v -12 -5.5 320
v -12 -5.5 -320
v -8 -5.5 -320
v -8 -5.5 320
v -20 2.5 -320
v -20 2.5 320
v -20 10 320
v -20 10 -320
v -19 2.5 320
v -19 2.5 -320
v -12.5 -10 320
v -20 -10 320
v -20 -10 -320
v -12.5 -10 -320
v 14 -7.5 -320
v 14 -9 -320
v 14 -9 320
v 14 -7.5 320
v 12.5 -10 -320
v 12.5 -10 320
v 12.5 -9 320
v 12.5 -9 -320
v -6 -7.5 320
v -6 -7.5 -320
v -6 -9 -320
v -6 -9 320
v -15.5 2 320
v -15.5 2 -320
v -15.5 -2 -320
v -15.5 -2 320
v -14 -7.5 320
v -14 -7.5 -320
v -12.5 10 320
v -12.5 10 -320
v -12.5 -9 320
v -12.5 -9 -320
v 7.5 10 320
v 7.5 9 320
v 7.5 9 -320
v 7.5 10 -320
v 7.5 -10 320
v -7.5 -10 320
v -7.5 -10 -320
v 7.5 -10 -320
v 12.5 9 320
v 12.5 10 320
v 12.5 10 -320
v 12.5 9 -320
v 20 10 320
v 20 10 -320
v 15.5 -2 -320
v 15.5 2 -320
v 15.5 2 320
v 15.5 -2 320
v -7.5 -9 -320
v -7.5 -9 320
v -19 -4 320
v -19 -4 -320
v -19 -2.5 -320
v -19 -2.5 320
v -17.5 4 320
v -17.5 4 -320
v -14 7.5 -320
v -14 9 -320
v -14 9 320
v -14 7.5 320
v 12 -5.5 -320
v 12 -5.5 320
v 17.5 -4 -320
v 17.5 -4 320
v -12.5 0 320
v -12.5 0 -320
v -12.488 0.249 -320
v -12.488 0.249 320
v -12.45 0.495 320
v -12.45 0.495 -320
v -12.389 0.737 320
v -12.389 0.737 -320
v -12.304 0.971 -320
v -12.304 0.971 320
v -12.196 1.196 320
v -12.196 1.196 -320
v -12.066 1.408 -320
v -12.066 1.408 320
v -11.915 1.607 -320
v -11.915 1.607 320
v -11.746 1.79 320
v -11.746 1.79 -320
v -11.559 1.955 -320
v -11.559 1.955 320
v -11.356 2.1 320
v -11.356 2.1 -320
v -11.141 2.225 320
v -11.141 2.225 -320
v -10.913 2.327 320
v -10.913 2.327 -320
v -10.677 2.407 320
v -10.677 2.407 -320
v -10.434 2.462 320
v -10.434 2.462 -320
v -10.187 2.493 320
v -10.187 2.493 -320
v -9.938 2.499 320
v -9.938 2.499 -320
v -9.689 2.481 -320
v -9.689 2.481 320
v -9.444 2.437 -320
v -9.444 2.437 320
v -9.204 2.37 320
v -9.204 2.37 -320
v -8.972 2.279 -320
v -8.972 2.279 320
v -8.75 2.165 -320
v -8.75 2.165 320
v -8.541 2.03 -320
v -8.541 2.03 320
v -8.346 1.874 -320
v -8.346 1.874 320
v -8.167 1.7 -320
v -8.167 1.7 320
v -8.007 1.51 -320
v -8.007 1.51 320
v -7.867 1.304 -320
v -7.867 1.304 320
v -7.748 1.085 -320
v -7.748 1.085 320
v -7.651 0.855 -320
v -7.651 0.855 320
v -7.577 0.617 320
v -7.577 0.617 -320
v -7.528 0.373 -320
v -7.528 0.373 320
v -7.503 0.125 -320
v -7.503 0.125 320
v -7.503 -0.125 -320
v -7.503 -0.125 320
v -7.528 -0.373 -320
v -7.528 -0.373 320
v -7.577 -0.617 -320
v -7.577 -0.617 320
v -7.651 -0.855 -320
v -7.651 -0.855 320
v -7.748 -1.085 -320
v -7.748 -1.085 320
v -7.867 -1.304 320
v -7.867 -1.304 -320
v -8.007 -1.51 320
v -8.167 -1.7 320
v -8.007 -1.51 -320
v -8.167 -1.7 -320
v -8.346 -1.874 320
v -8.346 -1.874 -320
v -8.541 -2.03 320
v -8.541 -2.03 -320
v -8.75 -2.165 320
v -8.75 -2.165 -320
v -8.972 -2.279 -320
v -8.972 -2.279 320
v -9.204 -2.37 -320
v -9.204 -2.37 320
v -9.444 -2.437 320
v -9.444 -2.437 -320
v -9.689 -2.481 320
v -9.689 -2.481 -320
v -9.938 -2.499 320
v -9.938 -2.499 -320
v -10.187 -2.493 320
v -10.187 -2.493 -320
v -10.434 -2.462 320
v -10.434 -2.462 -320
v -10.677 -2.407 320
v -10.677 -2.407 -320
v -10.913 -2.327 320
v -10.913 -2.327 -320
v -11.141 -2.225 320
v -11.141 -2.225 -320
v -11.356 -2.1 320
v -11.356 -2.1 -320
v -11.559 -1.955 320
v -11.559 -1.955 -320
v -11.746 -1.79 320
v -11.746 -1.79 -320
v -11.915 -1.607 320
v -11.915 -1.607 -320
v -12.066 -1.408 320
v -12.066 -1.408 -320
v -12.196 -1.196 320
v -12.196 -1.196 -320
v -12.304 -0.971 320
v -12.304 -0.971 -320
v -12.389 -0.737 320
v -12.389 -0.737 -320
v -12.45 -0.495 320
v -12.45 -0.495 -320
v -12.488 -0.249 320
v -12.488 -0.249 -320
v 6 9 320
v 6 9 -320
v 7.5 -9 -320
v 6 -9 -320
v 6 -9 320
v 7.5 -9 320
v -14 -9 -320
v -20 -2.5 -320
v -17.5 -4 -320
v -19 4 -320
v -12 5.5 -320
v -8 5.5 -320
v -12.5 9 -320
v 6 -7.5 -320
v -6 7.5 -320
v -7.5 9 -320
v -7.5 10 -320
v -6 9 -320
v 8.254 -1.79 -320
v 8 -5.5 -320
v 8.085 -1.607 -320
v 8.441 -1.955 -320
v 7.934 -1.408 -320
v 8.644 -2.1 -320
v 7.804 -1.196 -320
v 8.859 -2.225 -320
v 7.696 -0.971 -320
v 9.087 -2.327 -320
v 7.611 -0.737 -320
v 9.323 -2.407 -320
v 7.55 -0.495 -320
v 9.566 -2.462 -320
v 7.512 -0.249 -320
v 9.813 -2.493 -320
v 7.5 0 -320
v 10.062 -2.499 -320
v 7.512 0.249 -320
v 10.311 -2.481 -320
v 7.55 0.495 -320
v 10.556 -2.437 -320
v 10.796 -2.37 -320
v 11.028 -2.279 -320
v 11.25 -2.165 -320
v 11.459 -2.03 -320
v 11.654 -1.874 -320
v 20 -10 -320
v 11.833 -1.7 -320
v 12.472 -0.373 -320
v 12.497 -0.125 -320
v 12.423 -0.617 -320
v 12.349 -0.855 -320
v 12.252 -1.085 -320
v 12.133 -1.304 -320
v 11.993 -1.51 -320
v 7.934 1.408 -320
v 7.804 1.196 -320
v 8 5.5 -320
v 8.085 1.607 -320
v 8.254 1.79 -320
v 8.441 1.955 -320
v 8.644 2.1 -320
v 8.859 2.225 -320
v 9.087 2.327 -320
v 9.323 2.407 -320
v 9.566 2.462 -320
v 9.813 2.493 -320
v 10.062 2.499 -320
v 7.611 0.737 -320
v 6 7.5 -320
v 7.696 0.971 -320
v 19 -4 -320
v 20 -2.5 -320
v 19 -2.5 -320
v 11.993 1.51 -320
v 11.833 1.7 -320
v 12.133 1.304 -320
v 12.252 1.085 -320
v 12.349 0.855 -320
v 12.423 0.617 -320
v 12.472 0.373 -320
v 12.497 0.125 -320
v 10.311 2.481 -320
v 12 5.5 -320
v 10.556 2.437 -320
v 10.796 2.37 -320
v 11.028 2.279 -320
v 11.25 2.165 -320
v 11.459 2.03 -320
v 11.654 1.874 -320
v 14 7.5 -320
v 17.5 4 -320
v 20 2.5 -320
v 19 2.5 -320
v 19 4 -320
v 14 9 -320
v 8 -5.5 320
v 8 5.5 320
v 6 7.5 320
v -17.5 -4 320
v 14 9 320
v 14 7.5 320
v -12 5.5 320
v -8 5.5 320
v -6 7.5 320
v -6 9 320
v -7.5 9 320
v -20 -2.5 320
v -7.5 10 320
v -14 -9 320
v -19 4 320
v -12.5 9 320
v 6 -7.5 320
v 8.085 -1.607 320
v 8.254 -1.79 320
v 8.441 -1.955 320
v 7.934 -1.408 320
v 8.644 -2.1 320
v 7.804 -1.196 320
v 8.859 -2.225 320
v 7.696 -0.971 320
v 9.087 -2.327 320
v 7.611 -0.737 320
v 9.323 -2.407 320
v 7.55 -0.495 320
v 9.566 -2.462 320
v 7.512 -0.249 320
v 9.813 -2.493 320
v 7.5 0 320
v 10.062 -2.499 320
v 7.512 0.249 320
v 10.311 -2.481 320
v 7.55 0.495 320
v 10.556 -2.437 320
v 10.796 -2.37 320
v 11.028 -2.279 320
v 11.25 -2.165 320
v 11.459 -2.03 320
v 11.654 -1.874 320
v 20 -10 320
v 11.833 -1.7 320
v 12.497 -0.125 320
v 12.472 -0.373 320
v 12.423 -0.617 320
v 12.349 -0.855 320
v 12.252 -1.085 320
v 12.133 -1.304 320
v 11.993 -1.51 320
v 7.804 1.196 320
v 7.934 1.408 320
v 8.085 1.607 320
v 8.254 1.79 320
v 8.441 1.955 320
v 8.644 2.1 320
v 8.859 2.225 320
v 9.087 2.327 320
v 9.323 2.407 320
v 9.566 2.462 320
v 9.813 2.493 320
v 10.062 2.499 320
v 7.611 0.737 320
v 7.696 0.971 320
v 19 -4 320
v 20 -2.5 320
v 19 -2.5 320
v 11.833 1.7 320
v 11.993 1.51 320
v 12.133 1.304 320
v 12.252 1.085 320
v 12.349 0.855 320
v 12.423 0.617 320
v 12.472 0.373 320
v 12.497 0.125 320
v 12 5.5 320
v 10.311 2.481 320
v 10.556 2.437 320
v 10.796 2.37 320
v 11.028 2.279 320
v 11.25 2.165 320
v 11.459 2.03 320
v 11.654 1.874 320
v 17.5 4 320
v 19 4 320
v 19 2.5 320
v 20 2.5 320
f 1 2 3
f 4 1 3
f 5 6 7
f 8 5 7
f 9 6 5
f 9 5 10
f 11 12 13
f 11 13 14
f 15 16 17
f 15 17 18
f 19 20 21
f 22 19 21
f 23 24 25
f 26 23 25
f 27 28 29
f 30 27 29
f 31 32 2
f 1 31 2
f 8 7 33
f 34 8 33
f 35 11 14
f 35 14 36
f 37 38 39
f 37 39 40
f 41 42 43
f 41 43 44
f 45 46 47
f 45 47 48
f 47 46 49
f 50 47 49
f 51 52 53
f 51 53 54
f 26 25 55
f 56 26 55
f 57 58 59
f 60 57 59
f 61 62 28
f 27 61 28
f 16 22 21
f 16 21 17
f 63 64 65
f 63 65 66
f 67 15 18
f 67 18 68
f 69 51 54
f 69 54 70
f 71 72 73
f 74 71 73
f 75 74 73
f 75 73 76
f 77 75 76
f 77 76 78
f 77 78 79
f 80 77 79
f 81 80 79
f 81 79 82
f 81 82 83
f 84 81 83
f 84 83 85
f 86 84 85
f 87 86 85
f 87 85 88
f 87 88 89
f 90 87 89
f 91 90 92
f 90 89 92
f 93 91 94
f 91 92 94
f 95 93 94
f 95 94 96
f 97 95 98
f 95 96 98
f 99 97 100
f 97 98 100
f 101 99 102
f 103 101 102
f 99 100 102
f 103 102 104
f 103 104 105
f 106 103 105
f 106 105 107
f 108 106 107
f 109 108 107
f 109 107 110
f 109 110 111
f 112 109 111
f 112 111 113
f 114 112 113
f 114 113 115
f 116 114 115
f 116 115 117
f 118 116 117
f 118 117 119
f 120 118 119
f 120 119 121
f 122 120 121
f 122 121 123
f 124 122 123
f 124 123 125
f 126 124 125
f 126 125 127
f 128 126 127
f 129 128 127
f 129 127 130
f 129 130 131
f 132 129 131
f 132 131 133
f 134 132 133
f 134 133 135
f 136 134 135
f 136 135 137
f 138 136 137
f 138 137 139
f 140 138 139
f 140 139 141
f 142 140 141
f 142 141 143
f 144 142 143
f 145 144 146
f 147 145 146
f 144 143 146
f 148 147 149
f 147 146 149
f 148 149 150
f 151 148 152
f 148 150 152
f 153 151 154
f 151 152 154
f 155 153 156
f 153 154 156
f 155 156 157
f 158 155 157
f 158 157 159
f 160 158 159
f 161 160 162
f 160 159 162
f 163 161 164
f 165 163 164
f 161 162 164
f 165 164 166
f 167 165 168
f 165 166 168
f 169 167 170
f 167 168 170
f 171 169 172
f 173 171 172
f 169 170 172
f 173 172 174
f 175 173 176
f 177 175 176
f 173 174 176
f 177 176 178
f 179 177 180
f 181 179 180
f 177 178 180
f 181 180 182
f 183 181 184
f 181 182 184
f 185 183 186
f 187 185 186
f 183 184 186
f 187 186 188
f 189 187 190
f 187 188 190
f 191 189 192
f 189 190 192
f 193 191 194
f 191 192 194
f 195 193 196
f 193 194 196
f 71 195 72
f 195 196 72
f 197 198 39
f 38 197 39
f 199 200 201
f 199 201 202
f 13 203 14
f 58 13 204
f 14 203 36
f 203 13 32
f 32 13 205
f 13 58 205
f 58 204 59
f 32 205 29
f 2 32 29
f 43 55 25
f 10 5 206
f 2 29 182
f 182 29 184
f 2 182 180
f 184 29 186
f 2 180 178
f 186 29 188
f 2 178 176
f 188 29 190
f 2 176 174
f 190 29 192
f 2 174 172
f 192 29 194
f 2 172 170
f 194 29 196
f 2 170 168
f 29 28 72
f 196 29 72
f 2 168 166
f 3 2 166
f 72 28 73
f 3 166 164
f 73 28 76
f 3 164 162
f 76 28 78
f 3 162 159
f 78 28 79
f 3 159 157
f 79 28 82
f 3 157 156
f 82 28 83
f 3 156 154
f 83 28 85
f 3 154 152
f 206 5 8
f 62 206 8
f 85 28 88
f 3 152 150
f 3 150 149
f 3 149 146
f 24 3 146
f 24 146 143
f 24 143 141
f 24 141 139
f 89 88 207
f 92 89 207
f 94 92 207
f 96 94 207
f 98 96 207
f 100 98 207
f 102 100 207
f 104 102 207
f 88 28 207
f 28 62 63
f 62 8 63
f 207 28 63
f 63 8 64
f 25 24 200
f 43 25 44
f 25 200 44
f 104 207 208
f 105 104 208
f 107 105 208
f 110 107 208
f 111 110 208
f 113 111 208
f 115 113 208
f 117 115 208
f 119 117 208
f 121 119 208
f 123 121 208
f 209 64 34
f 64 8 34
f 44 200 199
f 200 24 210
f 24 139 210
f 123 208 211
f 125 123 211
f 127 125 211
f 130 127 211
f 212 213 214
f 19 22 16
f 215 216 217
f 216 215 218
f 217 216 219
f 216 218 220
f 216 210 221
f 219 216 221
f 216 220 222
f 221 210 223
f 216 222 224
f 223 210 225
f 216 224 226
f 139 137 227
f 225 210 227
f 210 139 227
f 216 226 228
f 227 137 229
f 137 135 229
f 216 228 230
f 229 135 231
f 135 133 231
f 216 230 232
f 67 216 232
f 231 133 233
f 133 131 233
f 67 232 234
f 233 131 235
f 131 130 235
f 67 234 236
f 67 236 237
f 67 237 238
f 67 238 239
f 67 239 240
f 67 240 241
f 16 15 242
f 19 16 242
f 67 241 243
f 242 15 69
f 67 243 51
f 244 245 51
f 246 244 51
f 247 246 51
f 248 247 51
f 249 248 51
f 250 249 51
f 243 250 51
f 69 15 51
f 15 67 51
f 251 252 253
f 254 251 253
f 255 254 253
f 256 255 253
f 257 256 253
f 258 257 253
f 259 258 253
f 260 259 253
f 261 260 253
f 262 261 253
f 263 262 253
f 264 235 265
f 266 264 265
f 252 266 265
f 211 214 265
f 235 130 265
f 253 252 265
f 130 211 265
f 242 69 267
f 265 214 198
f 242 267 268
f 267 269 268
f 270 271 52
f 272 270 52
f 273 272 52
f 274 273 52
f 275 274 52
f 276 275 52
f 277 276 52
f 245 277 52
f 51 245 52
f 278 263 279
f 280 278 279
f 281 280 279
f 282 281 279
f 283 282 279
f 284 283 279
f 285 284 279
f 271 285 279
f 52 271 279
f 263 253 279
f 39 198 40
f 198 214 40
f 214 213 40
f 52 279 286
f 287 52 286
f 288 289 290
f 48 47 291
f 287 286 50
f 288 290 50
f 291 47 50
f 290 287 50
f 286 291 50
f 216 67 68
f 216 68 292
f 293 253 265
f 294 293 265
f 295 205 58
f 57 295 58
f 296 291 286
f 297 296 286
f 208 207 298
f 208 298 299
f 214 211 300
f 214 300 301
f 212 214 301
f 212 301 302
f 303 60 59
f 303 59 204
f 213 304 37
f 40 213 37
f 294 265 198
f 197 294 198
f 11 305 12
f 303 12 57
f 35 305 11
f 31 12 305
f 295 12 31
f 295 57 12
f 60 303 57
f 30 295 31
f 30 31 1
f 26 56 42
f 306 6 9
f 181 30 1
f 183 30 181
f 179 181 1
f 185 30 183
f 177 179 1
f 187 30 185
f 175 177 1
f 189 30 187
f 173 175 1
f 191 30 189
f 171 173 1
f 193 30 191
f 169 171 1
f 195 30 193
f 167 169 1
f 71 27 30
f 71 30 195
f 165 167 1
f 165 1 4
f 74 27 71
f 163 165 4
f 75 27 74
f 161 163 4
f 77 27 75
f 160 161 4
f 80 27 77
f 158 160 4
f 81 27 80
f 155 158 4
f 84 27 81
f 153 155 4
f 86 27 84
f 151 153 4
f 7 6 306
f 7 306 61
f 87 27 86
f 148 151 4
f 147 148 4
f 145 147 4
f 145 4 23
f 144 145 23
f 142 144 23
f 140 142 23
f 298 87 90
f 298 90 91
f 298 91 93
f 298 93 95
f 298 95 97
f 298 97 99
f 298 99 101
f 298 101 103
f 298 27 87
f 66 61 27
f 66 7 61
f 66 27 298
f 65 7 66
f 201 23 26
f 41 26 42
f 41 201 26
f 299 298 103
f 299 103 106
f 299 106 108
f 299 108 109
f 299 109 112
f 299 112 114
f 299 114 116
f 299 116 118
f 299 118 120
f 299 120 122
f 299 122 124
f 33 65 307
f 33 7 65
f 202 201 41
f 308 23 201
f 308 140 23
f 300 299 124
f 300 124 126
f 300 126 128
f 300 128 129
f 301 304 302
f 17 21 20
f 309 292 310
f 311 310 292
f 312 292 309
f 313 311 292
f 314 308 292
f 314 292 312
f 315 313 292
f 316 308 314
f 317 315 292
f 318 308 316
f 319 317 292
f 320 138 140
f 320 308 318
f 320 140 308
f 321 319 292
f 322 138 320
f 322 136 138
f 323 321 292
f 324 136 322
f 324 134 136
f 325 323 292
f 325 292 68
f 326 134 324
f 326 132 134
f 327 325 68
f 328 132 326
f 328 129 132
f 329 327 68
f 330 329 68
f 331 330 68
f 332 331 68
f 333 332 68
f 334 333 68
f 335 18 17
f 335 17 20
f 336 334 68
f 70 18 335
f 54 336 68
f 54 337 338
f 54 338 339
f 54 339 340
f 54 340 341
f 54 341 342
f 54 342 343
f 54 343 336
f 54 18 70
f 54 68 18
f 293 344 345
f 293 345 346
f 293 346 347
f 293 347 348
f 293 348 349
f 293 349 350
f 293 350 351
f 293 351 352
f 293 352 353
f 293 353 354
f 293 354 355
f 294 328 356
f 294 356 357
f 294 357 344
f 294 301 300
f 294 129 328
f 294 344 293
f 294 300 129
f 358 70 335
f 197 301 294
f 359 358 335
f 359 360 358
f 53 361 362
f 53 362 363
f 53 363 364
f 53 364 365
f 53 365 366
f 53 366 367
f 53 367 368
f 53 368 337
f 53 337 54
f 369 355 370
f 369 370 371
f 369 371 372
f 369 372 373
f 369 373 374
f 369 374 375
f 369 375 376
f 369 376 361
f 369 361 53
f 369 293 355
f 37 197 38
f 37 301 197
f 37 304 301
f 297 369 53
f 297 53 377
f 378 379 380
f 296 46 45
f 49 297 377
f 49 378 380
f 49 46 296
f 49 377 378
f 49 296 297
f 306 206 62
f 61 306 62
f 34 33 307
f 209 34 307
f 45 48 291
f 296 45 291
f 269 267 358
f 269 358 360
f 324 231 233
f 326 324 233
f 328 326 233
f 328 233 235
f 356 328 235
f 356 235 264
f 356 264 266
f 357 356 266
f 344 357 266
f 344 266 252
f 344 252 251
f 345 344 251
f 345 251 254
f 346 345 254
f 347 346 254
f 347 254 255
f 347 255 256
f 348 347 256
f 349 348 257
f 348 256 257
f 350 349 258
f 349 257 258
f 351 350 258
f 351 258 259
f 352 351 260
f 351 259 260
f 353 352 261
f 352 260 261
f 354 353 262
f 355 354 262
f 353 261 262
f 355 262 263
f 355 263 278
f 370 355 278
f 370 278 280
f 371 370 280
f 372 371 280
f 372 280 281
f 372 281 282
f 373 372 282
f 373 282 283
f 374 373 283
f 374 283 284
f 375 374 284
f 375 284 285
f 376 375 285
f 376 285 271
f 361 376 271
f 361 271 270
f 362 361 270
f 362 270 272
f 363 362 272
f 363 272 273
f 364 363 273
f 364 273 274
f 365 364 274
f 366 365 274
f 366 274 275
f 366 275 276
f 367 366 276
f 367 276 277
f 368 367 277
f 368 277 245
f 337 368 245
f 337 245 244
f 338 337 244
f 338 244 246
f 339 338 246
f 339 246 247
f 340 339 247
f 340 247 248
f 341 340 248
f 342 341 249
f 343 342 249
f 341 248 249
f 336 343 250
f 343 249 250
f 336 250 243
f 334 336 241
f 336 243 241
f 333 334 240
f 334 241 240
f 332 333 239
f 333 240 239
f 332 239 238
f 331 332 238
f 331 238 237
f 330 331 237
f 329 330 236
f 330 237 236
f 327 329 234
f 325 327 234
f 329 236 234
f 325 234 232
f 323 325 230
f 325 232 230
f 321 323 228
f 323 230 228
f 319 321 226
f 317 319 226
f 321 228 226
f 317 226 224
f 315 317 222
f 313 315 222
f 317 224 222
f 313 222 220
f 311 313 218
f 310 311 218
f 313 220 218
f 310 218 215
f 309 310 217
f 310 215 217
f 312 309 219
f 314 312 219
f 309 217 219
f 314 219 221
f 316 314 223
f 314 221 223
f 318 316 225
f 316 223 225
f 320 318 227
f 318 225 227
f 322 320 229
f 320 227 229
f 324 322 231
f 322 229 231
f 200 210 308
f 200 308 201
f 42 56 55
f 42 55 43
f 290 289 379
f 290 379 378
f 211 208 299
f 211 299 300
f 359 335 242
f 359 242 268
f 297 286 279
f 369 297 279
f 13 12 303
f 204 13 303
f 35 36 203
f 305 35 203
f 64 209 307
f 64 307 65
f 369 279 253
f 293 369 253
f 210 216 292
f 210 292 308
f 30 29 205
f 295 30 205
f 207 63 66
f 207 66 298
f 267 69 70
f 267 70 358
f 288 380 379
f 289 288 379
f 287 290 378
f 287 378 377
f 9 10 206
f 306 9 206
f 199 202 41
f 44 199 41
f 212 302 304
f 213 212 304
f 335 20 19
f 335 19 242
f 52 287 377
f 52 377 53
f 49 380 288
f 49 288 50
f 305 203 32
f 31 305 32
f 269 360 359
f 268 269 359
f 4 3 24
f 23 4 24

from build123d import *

# Parameters (mm, degrees)
SKETCH_1_W          = 40
SKETCH_1_H          = 20
EXTRUDE_1_DEPTH     = 320
SKETCH_2_R          = 2.5
CUT_EXTRUDE_1_DEPTH = 641


with BuildPart() as part:
    # 草图1 → 凸台-拉伸1 (new body, symmetric)
    with BuildSketch(Plane.XY):
        Rectangle(SKETCH_1_W, SKETCH_1_H)
    extrude(amount=EXTRUDE_1_DEPTH, both=True)

    # 草图2 → 切除-拉伸1 (cut, through all)
    with BuildSketch(Plane(origin=(0, 0, -320), x_dir=(-1, 0, 0), z_dir=(0, 0, -1))):
        with Locations((-10, 0)):
            Circle(SKETCH_2_R)
        with Locations((10, 0)):
            Circle(SKETCH_2_R)
        Polygon((-12.5, 10), (-12.5, 9), (-14, 9), (-14, 7.5), (-12, 5.5), (-8, 5.5), (-6, 7.5), (-6, 9), (-7.5, 9), (-7.5, 10), align=None)
        Polygon((-7.5, -9), (-7.5, -10), (-12.5, -10), (-12.5, -9), (-14, -9), (-14, -7.5), (-12, -5.5), (-8, -5.5), (-6, -7.5), (-6, -9), align=None)
        Polygon((-20, 2.5), (-19, 2.5), (-19, 4), (-17.5, 4), (-15.5, 2), (-15.5, -2), (-17.5, -4), (-19, -4), (-19, -2.5), (-20, -2.5), align=None)
        Polygon((7.5, 9), (7.5, 10), (12.5, 10), (12.5, 9), (14, 9), (14, 7.5), (12, 5.5), (8, 5.5), (6, 7.5), (6, 9), align=None)
        Polygon((6, -9), (7.5, -9), (7.5, -10), (12.5, -10), (12.5, -9), (14, -9), (14, -7.5), (12, -5.5), (8, -5.5), (6, -7.5), align=None)
        Polygon((19, -2.5), (20, -2.5), (20, 2.5), (19, 2.5), (19, 4), (17.5, 4), (15.5, 2), (15.5, -2), (17.5, -4), (19, -4), align=None)
    extrude(amount=-CUT_EXTRUDE_1_DEPTH, mode=Mode.SUBTRACT)


solid = part.part
